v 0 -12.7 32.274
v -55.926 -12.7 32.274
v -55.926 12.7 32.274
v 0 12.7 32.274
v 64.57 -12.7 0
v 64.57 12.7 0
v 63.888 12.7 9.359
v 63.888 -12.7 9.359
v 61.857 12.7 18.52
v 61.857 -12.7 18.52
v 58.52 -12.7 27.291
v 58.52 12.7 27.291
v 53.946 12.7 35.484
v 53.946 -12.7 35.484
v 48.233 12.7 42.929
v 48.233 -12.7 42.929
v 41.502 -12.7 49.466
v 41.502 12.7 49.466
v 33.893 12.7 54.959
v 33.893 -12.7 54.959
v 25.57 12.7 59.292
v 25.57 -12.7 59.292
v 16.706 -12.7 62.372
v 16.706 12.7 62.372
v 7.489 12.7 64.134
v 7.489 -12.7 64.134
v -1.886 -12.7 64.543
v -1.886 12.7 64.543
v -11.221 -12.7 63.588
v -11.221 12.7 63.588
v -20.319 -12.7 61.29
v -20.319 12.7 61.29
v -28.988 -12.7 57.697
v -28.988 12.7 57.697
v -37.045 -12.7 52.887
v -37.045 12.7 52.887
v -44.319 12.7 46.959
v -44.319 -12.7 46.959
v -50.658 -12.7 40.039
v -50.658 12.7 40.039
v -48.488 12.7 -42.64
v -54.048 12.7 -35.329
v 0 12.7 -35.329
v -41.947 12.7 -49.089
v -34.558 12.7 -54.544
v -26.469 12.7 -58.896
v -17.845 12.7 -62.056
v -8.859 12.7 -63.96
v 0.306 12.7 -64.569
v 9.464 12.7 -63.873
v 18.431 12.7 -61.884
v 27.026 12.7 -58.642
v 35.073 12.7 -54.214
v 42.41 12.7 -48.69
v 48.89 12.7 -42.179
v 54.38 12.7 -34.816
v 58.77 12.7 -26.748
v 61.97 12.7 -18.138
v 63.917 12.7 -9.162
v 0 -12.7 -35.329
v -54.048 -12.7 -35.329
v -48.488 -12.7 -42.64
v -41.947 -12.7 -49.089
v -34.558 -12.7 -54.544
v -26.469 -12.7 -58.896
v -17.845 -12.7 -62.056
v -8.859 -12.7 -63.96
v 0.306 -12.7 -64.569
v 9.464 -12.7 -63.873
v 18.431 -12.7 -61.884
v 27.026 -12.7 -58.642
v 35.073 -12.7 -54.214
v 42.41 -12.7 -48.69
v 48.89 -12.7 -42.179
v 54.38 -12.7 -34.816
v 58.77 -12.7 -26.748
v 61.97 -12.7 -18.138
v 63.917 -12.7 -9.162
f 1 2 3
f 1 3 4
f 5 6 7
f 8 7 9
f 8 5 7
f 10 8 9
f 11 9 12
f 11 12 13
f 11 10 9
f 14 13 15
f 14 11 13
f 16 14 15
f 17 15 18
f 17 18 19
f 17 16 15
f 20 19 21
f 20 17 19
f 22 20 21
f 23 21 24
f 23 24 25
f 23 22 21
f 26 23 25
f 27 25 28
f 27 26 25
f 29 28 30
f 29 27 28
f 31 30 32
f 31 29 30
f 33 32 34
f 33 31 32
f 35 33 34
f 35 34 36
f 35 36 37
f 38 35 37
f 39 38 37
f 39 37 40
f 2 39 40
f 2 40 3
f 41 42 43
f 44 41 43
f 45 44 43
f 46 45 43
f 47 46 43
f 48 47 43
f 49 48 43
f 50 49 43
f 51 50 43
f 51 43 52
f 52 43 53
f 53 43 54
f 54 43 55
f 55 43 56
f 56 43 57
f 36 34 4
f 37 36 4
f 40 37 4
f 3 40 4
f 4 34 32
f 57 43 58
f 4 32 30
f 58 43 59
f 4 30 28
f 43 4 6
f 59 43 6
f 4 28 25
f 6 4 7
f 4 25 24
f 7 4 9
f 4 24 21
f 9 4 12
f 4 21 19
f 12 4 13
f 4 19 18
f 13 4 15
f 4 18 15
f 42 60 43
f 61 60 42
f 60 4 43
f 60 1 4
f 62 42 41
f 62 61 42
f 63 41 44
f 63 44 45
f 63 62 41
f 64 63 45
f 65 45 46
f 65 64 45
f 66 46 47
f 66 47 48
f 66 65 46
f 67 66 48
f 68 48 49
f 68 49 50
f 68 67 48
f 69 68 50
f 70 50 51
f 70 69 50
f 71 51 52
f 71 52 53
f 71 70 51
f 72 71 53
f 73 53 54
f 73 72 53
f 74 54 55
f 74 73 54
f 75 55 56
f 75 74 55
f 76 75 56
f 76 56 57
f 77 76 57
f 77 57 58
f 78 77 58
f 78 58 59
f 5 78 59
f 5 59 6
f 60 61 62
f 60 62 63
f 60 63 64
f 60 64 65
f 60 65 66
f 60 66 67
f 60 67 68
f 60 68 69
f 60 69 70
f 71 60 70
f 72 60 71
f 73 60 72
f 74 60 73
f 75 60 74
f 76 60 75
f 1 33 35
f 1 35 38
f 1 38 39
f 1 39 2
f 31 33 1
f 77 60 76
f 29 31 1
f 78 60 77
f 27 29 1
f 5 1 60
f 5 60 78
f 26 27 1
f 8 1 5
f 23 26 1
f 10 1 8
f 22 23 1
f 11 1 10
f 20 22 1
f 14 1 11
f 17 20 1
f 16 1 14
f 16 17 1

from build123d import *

# Parameters (mm, degrees)
F1_DEPTH = 12.7


with BuildPart() as f1:
    # F0 (on Front) → F1 (new body, symmetric)
    with BuildSketch(Plane.XZ):
        with BuildLine():
            ThreePointArc((-54.047783, -35.329167), (18.431438, -61.883721), (64.570217, 0))
            ThreePointArc((64.570217, 0), (16.705627, 62.371748), (-55.926047, 32.273676))
            Line((-55.926047, 32.273676), (0, 32.273676))
            Line((0, 32.273676), (0, -35.329167))
            Line((0, -35.329167), (-54.047783, -35.329167))
        make_face()
    extrude(amount=F1_DEPTH, both=True)


solid = f1.part
